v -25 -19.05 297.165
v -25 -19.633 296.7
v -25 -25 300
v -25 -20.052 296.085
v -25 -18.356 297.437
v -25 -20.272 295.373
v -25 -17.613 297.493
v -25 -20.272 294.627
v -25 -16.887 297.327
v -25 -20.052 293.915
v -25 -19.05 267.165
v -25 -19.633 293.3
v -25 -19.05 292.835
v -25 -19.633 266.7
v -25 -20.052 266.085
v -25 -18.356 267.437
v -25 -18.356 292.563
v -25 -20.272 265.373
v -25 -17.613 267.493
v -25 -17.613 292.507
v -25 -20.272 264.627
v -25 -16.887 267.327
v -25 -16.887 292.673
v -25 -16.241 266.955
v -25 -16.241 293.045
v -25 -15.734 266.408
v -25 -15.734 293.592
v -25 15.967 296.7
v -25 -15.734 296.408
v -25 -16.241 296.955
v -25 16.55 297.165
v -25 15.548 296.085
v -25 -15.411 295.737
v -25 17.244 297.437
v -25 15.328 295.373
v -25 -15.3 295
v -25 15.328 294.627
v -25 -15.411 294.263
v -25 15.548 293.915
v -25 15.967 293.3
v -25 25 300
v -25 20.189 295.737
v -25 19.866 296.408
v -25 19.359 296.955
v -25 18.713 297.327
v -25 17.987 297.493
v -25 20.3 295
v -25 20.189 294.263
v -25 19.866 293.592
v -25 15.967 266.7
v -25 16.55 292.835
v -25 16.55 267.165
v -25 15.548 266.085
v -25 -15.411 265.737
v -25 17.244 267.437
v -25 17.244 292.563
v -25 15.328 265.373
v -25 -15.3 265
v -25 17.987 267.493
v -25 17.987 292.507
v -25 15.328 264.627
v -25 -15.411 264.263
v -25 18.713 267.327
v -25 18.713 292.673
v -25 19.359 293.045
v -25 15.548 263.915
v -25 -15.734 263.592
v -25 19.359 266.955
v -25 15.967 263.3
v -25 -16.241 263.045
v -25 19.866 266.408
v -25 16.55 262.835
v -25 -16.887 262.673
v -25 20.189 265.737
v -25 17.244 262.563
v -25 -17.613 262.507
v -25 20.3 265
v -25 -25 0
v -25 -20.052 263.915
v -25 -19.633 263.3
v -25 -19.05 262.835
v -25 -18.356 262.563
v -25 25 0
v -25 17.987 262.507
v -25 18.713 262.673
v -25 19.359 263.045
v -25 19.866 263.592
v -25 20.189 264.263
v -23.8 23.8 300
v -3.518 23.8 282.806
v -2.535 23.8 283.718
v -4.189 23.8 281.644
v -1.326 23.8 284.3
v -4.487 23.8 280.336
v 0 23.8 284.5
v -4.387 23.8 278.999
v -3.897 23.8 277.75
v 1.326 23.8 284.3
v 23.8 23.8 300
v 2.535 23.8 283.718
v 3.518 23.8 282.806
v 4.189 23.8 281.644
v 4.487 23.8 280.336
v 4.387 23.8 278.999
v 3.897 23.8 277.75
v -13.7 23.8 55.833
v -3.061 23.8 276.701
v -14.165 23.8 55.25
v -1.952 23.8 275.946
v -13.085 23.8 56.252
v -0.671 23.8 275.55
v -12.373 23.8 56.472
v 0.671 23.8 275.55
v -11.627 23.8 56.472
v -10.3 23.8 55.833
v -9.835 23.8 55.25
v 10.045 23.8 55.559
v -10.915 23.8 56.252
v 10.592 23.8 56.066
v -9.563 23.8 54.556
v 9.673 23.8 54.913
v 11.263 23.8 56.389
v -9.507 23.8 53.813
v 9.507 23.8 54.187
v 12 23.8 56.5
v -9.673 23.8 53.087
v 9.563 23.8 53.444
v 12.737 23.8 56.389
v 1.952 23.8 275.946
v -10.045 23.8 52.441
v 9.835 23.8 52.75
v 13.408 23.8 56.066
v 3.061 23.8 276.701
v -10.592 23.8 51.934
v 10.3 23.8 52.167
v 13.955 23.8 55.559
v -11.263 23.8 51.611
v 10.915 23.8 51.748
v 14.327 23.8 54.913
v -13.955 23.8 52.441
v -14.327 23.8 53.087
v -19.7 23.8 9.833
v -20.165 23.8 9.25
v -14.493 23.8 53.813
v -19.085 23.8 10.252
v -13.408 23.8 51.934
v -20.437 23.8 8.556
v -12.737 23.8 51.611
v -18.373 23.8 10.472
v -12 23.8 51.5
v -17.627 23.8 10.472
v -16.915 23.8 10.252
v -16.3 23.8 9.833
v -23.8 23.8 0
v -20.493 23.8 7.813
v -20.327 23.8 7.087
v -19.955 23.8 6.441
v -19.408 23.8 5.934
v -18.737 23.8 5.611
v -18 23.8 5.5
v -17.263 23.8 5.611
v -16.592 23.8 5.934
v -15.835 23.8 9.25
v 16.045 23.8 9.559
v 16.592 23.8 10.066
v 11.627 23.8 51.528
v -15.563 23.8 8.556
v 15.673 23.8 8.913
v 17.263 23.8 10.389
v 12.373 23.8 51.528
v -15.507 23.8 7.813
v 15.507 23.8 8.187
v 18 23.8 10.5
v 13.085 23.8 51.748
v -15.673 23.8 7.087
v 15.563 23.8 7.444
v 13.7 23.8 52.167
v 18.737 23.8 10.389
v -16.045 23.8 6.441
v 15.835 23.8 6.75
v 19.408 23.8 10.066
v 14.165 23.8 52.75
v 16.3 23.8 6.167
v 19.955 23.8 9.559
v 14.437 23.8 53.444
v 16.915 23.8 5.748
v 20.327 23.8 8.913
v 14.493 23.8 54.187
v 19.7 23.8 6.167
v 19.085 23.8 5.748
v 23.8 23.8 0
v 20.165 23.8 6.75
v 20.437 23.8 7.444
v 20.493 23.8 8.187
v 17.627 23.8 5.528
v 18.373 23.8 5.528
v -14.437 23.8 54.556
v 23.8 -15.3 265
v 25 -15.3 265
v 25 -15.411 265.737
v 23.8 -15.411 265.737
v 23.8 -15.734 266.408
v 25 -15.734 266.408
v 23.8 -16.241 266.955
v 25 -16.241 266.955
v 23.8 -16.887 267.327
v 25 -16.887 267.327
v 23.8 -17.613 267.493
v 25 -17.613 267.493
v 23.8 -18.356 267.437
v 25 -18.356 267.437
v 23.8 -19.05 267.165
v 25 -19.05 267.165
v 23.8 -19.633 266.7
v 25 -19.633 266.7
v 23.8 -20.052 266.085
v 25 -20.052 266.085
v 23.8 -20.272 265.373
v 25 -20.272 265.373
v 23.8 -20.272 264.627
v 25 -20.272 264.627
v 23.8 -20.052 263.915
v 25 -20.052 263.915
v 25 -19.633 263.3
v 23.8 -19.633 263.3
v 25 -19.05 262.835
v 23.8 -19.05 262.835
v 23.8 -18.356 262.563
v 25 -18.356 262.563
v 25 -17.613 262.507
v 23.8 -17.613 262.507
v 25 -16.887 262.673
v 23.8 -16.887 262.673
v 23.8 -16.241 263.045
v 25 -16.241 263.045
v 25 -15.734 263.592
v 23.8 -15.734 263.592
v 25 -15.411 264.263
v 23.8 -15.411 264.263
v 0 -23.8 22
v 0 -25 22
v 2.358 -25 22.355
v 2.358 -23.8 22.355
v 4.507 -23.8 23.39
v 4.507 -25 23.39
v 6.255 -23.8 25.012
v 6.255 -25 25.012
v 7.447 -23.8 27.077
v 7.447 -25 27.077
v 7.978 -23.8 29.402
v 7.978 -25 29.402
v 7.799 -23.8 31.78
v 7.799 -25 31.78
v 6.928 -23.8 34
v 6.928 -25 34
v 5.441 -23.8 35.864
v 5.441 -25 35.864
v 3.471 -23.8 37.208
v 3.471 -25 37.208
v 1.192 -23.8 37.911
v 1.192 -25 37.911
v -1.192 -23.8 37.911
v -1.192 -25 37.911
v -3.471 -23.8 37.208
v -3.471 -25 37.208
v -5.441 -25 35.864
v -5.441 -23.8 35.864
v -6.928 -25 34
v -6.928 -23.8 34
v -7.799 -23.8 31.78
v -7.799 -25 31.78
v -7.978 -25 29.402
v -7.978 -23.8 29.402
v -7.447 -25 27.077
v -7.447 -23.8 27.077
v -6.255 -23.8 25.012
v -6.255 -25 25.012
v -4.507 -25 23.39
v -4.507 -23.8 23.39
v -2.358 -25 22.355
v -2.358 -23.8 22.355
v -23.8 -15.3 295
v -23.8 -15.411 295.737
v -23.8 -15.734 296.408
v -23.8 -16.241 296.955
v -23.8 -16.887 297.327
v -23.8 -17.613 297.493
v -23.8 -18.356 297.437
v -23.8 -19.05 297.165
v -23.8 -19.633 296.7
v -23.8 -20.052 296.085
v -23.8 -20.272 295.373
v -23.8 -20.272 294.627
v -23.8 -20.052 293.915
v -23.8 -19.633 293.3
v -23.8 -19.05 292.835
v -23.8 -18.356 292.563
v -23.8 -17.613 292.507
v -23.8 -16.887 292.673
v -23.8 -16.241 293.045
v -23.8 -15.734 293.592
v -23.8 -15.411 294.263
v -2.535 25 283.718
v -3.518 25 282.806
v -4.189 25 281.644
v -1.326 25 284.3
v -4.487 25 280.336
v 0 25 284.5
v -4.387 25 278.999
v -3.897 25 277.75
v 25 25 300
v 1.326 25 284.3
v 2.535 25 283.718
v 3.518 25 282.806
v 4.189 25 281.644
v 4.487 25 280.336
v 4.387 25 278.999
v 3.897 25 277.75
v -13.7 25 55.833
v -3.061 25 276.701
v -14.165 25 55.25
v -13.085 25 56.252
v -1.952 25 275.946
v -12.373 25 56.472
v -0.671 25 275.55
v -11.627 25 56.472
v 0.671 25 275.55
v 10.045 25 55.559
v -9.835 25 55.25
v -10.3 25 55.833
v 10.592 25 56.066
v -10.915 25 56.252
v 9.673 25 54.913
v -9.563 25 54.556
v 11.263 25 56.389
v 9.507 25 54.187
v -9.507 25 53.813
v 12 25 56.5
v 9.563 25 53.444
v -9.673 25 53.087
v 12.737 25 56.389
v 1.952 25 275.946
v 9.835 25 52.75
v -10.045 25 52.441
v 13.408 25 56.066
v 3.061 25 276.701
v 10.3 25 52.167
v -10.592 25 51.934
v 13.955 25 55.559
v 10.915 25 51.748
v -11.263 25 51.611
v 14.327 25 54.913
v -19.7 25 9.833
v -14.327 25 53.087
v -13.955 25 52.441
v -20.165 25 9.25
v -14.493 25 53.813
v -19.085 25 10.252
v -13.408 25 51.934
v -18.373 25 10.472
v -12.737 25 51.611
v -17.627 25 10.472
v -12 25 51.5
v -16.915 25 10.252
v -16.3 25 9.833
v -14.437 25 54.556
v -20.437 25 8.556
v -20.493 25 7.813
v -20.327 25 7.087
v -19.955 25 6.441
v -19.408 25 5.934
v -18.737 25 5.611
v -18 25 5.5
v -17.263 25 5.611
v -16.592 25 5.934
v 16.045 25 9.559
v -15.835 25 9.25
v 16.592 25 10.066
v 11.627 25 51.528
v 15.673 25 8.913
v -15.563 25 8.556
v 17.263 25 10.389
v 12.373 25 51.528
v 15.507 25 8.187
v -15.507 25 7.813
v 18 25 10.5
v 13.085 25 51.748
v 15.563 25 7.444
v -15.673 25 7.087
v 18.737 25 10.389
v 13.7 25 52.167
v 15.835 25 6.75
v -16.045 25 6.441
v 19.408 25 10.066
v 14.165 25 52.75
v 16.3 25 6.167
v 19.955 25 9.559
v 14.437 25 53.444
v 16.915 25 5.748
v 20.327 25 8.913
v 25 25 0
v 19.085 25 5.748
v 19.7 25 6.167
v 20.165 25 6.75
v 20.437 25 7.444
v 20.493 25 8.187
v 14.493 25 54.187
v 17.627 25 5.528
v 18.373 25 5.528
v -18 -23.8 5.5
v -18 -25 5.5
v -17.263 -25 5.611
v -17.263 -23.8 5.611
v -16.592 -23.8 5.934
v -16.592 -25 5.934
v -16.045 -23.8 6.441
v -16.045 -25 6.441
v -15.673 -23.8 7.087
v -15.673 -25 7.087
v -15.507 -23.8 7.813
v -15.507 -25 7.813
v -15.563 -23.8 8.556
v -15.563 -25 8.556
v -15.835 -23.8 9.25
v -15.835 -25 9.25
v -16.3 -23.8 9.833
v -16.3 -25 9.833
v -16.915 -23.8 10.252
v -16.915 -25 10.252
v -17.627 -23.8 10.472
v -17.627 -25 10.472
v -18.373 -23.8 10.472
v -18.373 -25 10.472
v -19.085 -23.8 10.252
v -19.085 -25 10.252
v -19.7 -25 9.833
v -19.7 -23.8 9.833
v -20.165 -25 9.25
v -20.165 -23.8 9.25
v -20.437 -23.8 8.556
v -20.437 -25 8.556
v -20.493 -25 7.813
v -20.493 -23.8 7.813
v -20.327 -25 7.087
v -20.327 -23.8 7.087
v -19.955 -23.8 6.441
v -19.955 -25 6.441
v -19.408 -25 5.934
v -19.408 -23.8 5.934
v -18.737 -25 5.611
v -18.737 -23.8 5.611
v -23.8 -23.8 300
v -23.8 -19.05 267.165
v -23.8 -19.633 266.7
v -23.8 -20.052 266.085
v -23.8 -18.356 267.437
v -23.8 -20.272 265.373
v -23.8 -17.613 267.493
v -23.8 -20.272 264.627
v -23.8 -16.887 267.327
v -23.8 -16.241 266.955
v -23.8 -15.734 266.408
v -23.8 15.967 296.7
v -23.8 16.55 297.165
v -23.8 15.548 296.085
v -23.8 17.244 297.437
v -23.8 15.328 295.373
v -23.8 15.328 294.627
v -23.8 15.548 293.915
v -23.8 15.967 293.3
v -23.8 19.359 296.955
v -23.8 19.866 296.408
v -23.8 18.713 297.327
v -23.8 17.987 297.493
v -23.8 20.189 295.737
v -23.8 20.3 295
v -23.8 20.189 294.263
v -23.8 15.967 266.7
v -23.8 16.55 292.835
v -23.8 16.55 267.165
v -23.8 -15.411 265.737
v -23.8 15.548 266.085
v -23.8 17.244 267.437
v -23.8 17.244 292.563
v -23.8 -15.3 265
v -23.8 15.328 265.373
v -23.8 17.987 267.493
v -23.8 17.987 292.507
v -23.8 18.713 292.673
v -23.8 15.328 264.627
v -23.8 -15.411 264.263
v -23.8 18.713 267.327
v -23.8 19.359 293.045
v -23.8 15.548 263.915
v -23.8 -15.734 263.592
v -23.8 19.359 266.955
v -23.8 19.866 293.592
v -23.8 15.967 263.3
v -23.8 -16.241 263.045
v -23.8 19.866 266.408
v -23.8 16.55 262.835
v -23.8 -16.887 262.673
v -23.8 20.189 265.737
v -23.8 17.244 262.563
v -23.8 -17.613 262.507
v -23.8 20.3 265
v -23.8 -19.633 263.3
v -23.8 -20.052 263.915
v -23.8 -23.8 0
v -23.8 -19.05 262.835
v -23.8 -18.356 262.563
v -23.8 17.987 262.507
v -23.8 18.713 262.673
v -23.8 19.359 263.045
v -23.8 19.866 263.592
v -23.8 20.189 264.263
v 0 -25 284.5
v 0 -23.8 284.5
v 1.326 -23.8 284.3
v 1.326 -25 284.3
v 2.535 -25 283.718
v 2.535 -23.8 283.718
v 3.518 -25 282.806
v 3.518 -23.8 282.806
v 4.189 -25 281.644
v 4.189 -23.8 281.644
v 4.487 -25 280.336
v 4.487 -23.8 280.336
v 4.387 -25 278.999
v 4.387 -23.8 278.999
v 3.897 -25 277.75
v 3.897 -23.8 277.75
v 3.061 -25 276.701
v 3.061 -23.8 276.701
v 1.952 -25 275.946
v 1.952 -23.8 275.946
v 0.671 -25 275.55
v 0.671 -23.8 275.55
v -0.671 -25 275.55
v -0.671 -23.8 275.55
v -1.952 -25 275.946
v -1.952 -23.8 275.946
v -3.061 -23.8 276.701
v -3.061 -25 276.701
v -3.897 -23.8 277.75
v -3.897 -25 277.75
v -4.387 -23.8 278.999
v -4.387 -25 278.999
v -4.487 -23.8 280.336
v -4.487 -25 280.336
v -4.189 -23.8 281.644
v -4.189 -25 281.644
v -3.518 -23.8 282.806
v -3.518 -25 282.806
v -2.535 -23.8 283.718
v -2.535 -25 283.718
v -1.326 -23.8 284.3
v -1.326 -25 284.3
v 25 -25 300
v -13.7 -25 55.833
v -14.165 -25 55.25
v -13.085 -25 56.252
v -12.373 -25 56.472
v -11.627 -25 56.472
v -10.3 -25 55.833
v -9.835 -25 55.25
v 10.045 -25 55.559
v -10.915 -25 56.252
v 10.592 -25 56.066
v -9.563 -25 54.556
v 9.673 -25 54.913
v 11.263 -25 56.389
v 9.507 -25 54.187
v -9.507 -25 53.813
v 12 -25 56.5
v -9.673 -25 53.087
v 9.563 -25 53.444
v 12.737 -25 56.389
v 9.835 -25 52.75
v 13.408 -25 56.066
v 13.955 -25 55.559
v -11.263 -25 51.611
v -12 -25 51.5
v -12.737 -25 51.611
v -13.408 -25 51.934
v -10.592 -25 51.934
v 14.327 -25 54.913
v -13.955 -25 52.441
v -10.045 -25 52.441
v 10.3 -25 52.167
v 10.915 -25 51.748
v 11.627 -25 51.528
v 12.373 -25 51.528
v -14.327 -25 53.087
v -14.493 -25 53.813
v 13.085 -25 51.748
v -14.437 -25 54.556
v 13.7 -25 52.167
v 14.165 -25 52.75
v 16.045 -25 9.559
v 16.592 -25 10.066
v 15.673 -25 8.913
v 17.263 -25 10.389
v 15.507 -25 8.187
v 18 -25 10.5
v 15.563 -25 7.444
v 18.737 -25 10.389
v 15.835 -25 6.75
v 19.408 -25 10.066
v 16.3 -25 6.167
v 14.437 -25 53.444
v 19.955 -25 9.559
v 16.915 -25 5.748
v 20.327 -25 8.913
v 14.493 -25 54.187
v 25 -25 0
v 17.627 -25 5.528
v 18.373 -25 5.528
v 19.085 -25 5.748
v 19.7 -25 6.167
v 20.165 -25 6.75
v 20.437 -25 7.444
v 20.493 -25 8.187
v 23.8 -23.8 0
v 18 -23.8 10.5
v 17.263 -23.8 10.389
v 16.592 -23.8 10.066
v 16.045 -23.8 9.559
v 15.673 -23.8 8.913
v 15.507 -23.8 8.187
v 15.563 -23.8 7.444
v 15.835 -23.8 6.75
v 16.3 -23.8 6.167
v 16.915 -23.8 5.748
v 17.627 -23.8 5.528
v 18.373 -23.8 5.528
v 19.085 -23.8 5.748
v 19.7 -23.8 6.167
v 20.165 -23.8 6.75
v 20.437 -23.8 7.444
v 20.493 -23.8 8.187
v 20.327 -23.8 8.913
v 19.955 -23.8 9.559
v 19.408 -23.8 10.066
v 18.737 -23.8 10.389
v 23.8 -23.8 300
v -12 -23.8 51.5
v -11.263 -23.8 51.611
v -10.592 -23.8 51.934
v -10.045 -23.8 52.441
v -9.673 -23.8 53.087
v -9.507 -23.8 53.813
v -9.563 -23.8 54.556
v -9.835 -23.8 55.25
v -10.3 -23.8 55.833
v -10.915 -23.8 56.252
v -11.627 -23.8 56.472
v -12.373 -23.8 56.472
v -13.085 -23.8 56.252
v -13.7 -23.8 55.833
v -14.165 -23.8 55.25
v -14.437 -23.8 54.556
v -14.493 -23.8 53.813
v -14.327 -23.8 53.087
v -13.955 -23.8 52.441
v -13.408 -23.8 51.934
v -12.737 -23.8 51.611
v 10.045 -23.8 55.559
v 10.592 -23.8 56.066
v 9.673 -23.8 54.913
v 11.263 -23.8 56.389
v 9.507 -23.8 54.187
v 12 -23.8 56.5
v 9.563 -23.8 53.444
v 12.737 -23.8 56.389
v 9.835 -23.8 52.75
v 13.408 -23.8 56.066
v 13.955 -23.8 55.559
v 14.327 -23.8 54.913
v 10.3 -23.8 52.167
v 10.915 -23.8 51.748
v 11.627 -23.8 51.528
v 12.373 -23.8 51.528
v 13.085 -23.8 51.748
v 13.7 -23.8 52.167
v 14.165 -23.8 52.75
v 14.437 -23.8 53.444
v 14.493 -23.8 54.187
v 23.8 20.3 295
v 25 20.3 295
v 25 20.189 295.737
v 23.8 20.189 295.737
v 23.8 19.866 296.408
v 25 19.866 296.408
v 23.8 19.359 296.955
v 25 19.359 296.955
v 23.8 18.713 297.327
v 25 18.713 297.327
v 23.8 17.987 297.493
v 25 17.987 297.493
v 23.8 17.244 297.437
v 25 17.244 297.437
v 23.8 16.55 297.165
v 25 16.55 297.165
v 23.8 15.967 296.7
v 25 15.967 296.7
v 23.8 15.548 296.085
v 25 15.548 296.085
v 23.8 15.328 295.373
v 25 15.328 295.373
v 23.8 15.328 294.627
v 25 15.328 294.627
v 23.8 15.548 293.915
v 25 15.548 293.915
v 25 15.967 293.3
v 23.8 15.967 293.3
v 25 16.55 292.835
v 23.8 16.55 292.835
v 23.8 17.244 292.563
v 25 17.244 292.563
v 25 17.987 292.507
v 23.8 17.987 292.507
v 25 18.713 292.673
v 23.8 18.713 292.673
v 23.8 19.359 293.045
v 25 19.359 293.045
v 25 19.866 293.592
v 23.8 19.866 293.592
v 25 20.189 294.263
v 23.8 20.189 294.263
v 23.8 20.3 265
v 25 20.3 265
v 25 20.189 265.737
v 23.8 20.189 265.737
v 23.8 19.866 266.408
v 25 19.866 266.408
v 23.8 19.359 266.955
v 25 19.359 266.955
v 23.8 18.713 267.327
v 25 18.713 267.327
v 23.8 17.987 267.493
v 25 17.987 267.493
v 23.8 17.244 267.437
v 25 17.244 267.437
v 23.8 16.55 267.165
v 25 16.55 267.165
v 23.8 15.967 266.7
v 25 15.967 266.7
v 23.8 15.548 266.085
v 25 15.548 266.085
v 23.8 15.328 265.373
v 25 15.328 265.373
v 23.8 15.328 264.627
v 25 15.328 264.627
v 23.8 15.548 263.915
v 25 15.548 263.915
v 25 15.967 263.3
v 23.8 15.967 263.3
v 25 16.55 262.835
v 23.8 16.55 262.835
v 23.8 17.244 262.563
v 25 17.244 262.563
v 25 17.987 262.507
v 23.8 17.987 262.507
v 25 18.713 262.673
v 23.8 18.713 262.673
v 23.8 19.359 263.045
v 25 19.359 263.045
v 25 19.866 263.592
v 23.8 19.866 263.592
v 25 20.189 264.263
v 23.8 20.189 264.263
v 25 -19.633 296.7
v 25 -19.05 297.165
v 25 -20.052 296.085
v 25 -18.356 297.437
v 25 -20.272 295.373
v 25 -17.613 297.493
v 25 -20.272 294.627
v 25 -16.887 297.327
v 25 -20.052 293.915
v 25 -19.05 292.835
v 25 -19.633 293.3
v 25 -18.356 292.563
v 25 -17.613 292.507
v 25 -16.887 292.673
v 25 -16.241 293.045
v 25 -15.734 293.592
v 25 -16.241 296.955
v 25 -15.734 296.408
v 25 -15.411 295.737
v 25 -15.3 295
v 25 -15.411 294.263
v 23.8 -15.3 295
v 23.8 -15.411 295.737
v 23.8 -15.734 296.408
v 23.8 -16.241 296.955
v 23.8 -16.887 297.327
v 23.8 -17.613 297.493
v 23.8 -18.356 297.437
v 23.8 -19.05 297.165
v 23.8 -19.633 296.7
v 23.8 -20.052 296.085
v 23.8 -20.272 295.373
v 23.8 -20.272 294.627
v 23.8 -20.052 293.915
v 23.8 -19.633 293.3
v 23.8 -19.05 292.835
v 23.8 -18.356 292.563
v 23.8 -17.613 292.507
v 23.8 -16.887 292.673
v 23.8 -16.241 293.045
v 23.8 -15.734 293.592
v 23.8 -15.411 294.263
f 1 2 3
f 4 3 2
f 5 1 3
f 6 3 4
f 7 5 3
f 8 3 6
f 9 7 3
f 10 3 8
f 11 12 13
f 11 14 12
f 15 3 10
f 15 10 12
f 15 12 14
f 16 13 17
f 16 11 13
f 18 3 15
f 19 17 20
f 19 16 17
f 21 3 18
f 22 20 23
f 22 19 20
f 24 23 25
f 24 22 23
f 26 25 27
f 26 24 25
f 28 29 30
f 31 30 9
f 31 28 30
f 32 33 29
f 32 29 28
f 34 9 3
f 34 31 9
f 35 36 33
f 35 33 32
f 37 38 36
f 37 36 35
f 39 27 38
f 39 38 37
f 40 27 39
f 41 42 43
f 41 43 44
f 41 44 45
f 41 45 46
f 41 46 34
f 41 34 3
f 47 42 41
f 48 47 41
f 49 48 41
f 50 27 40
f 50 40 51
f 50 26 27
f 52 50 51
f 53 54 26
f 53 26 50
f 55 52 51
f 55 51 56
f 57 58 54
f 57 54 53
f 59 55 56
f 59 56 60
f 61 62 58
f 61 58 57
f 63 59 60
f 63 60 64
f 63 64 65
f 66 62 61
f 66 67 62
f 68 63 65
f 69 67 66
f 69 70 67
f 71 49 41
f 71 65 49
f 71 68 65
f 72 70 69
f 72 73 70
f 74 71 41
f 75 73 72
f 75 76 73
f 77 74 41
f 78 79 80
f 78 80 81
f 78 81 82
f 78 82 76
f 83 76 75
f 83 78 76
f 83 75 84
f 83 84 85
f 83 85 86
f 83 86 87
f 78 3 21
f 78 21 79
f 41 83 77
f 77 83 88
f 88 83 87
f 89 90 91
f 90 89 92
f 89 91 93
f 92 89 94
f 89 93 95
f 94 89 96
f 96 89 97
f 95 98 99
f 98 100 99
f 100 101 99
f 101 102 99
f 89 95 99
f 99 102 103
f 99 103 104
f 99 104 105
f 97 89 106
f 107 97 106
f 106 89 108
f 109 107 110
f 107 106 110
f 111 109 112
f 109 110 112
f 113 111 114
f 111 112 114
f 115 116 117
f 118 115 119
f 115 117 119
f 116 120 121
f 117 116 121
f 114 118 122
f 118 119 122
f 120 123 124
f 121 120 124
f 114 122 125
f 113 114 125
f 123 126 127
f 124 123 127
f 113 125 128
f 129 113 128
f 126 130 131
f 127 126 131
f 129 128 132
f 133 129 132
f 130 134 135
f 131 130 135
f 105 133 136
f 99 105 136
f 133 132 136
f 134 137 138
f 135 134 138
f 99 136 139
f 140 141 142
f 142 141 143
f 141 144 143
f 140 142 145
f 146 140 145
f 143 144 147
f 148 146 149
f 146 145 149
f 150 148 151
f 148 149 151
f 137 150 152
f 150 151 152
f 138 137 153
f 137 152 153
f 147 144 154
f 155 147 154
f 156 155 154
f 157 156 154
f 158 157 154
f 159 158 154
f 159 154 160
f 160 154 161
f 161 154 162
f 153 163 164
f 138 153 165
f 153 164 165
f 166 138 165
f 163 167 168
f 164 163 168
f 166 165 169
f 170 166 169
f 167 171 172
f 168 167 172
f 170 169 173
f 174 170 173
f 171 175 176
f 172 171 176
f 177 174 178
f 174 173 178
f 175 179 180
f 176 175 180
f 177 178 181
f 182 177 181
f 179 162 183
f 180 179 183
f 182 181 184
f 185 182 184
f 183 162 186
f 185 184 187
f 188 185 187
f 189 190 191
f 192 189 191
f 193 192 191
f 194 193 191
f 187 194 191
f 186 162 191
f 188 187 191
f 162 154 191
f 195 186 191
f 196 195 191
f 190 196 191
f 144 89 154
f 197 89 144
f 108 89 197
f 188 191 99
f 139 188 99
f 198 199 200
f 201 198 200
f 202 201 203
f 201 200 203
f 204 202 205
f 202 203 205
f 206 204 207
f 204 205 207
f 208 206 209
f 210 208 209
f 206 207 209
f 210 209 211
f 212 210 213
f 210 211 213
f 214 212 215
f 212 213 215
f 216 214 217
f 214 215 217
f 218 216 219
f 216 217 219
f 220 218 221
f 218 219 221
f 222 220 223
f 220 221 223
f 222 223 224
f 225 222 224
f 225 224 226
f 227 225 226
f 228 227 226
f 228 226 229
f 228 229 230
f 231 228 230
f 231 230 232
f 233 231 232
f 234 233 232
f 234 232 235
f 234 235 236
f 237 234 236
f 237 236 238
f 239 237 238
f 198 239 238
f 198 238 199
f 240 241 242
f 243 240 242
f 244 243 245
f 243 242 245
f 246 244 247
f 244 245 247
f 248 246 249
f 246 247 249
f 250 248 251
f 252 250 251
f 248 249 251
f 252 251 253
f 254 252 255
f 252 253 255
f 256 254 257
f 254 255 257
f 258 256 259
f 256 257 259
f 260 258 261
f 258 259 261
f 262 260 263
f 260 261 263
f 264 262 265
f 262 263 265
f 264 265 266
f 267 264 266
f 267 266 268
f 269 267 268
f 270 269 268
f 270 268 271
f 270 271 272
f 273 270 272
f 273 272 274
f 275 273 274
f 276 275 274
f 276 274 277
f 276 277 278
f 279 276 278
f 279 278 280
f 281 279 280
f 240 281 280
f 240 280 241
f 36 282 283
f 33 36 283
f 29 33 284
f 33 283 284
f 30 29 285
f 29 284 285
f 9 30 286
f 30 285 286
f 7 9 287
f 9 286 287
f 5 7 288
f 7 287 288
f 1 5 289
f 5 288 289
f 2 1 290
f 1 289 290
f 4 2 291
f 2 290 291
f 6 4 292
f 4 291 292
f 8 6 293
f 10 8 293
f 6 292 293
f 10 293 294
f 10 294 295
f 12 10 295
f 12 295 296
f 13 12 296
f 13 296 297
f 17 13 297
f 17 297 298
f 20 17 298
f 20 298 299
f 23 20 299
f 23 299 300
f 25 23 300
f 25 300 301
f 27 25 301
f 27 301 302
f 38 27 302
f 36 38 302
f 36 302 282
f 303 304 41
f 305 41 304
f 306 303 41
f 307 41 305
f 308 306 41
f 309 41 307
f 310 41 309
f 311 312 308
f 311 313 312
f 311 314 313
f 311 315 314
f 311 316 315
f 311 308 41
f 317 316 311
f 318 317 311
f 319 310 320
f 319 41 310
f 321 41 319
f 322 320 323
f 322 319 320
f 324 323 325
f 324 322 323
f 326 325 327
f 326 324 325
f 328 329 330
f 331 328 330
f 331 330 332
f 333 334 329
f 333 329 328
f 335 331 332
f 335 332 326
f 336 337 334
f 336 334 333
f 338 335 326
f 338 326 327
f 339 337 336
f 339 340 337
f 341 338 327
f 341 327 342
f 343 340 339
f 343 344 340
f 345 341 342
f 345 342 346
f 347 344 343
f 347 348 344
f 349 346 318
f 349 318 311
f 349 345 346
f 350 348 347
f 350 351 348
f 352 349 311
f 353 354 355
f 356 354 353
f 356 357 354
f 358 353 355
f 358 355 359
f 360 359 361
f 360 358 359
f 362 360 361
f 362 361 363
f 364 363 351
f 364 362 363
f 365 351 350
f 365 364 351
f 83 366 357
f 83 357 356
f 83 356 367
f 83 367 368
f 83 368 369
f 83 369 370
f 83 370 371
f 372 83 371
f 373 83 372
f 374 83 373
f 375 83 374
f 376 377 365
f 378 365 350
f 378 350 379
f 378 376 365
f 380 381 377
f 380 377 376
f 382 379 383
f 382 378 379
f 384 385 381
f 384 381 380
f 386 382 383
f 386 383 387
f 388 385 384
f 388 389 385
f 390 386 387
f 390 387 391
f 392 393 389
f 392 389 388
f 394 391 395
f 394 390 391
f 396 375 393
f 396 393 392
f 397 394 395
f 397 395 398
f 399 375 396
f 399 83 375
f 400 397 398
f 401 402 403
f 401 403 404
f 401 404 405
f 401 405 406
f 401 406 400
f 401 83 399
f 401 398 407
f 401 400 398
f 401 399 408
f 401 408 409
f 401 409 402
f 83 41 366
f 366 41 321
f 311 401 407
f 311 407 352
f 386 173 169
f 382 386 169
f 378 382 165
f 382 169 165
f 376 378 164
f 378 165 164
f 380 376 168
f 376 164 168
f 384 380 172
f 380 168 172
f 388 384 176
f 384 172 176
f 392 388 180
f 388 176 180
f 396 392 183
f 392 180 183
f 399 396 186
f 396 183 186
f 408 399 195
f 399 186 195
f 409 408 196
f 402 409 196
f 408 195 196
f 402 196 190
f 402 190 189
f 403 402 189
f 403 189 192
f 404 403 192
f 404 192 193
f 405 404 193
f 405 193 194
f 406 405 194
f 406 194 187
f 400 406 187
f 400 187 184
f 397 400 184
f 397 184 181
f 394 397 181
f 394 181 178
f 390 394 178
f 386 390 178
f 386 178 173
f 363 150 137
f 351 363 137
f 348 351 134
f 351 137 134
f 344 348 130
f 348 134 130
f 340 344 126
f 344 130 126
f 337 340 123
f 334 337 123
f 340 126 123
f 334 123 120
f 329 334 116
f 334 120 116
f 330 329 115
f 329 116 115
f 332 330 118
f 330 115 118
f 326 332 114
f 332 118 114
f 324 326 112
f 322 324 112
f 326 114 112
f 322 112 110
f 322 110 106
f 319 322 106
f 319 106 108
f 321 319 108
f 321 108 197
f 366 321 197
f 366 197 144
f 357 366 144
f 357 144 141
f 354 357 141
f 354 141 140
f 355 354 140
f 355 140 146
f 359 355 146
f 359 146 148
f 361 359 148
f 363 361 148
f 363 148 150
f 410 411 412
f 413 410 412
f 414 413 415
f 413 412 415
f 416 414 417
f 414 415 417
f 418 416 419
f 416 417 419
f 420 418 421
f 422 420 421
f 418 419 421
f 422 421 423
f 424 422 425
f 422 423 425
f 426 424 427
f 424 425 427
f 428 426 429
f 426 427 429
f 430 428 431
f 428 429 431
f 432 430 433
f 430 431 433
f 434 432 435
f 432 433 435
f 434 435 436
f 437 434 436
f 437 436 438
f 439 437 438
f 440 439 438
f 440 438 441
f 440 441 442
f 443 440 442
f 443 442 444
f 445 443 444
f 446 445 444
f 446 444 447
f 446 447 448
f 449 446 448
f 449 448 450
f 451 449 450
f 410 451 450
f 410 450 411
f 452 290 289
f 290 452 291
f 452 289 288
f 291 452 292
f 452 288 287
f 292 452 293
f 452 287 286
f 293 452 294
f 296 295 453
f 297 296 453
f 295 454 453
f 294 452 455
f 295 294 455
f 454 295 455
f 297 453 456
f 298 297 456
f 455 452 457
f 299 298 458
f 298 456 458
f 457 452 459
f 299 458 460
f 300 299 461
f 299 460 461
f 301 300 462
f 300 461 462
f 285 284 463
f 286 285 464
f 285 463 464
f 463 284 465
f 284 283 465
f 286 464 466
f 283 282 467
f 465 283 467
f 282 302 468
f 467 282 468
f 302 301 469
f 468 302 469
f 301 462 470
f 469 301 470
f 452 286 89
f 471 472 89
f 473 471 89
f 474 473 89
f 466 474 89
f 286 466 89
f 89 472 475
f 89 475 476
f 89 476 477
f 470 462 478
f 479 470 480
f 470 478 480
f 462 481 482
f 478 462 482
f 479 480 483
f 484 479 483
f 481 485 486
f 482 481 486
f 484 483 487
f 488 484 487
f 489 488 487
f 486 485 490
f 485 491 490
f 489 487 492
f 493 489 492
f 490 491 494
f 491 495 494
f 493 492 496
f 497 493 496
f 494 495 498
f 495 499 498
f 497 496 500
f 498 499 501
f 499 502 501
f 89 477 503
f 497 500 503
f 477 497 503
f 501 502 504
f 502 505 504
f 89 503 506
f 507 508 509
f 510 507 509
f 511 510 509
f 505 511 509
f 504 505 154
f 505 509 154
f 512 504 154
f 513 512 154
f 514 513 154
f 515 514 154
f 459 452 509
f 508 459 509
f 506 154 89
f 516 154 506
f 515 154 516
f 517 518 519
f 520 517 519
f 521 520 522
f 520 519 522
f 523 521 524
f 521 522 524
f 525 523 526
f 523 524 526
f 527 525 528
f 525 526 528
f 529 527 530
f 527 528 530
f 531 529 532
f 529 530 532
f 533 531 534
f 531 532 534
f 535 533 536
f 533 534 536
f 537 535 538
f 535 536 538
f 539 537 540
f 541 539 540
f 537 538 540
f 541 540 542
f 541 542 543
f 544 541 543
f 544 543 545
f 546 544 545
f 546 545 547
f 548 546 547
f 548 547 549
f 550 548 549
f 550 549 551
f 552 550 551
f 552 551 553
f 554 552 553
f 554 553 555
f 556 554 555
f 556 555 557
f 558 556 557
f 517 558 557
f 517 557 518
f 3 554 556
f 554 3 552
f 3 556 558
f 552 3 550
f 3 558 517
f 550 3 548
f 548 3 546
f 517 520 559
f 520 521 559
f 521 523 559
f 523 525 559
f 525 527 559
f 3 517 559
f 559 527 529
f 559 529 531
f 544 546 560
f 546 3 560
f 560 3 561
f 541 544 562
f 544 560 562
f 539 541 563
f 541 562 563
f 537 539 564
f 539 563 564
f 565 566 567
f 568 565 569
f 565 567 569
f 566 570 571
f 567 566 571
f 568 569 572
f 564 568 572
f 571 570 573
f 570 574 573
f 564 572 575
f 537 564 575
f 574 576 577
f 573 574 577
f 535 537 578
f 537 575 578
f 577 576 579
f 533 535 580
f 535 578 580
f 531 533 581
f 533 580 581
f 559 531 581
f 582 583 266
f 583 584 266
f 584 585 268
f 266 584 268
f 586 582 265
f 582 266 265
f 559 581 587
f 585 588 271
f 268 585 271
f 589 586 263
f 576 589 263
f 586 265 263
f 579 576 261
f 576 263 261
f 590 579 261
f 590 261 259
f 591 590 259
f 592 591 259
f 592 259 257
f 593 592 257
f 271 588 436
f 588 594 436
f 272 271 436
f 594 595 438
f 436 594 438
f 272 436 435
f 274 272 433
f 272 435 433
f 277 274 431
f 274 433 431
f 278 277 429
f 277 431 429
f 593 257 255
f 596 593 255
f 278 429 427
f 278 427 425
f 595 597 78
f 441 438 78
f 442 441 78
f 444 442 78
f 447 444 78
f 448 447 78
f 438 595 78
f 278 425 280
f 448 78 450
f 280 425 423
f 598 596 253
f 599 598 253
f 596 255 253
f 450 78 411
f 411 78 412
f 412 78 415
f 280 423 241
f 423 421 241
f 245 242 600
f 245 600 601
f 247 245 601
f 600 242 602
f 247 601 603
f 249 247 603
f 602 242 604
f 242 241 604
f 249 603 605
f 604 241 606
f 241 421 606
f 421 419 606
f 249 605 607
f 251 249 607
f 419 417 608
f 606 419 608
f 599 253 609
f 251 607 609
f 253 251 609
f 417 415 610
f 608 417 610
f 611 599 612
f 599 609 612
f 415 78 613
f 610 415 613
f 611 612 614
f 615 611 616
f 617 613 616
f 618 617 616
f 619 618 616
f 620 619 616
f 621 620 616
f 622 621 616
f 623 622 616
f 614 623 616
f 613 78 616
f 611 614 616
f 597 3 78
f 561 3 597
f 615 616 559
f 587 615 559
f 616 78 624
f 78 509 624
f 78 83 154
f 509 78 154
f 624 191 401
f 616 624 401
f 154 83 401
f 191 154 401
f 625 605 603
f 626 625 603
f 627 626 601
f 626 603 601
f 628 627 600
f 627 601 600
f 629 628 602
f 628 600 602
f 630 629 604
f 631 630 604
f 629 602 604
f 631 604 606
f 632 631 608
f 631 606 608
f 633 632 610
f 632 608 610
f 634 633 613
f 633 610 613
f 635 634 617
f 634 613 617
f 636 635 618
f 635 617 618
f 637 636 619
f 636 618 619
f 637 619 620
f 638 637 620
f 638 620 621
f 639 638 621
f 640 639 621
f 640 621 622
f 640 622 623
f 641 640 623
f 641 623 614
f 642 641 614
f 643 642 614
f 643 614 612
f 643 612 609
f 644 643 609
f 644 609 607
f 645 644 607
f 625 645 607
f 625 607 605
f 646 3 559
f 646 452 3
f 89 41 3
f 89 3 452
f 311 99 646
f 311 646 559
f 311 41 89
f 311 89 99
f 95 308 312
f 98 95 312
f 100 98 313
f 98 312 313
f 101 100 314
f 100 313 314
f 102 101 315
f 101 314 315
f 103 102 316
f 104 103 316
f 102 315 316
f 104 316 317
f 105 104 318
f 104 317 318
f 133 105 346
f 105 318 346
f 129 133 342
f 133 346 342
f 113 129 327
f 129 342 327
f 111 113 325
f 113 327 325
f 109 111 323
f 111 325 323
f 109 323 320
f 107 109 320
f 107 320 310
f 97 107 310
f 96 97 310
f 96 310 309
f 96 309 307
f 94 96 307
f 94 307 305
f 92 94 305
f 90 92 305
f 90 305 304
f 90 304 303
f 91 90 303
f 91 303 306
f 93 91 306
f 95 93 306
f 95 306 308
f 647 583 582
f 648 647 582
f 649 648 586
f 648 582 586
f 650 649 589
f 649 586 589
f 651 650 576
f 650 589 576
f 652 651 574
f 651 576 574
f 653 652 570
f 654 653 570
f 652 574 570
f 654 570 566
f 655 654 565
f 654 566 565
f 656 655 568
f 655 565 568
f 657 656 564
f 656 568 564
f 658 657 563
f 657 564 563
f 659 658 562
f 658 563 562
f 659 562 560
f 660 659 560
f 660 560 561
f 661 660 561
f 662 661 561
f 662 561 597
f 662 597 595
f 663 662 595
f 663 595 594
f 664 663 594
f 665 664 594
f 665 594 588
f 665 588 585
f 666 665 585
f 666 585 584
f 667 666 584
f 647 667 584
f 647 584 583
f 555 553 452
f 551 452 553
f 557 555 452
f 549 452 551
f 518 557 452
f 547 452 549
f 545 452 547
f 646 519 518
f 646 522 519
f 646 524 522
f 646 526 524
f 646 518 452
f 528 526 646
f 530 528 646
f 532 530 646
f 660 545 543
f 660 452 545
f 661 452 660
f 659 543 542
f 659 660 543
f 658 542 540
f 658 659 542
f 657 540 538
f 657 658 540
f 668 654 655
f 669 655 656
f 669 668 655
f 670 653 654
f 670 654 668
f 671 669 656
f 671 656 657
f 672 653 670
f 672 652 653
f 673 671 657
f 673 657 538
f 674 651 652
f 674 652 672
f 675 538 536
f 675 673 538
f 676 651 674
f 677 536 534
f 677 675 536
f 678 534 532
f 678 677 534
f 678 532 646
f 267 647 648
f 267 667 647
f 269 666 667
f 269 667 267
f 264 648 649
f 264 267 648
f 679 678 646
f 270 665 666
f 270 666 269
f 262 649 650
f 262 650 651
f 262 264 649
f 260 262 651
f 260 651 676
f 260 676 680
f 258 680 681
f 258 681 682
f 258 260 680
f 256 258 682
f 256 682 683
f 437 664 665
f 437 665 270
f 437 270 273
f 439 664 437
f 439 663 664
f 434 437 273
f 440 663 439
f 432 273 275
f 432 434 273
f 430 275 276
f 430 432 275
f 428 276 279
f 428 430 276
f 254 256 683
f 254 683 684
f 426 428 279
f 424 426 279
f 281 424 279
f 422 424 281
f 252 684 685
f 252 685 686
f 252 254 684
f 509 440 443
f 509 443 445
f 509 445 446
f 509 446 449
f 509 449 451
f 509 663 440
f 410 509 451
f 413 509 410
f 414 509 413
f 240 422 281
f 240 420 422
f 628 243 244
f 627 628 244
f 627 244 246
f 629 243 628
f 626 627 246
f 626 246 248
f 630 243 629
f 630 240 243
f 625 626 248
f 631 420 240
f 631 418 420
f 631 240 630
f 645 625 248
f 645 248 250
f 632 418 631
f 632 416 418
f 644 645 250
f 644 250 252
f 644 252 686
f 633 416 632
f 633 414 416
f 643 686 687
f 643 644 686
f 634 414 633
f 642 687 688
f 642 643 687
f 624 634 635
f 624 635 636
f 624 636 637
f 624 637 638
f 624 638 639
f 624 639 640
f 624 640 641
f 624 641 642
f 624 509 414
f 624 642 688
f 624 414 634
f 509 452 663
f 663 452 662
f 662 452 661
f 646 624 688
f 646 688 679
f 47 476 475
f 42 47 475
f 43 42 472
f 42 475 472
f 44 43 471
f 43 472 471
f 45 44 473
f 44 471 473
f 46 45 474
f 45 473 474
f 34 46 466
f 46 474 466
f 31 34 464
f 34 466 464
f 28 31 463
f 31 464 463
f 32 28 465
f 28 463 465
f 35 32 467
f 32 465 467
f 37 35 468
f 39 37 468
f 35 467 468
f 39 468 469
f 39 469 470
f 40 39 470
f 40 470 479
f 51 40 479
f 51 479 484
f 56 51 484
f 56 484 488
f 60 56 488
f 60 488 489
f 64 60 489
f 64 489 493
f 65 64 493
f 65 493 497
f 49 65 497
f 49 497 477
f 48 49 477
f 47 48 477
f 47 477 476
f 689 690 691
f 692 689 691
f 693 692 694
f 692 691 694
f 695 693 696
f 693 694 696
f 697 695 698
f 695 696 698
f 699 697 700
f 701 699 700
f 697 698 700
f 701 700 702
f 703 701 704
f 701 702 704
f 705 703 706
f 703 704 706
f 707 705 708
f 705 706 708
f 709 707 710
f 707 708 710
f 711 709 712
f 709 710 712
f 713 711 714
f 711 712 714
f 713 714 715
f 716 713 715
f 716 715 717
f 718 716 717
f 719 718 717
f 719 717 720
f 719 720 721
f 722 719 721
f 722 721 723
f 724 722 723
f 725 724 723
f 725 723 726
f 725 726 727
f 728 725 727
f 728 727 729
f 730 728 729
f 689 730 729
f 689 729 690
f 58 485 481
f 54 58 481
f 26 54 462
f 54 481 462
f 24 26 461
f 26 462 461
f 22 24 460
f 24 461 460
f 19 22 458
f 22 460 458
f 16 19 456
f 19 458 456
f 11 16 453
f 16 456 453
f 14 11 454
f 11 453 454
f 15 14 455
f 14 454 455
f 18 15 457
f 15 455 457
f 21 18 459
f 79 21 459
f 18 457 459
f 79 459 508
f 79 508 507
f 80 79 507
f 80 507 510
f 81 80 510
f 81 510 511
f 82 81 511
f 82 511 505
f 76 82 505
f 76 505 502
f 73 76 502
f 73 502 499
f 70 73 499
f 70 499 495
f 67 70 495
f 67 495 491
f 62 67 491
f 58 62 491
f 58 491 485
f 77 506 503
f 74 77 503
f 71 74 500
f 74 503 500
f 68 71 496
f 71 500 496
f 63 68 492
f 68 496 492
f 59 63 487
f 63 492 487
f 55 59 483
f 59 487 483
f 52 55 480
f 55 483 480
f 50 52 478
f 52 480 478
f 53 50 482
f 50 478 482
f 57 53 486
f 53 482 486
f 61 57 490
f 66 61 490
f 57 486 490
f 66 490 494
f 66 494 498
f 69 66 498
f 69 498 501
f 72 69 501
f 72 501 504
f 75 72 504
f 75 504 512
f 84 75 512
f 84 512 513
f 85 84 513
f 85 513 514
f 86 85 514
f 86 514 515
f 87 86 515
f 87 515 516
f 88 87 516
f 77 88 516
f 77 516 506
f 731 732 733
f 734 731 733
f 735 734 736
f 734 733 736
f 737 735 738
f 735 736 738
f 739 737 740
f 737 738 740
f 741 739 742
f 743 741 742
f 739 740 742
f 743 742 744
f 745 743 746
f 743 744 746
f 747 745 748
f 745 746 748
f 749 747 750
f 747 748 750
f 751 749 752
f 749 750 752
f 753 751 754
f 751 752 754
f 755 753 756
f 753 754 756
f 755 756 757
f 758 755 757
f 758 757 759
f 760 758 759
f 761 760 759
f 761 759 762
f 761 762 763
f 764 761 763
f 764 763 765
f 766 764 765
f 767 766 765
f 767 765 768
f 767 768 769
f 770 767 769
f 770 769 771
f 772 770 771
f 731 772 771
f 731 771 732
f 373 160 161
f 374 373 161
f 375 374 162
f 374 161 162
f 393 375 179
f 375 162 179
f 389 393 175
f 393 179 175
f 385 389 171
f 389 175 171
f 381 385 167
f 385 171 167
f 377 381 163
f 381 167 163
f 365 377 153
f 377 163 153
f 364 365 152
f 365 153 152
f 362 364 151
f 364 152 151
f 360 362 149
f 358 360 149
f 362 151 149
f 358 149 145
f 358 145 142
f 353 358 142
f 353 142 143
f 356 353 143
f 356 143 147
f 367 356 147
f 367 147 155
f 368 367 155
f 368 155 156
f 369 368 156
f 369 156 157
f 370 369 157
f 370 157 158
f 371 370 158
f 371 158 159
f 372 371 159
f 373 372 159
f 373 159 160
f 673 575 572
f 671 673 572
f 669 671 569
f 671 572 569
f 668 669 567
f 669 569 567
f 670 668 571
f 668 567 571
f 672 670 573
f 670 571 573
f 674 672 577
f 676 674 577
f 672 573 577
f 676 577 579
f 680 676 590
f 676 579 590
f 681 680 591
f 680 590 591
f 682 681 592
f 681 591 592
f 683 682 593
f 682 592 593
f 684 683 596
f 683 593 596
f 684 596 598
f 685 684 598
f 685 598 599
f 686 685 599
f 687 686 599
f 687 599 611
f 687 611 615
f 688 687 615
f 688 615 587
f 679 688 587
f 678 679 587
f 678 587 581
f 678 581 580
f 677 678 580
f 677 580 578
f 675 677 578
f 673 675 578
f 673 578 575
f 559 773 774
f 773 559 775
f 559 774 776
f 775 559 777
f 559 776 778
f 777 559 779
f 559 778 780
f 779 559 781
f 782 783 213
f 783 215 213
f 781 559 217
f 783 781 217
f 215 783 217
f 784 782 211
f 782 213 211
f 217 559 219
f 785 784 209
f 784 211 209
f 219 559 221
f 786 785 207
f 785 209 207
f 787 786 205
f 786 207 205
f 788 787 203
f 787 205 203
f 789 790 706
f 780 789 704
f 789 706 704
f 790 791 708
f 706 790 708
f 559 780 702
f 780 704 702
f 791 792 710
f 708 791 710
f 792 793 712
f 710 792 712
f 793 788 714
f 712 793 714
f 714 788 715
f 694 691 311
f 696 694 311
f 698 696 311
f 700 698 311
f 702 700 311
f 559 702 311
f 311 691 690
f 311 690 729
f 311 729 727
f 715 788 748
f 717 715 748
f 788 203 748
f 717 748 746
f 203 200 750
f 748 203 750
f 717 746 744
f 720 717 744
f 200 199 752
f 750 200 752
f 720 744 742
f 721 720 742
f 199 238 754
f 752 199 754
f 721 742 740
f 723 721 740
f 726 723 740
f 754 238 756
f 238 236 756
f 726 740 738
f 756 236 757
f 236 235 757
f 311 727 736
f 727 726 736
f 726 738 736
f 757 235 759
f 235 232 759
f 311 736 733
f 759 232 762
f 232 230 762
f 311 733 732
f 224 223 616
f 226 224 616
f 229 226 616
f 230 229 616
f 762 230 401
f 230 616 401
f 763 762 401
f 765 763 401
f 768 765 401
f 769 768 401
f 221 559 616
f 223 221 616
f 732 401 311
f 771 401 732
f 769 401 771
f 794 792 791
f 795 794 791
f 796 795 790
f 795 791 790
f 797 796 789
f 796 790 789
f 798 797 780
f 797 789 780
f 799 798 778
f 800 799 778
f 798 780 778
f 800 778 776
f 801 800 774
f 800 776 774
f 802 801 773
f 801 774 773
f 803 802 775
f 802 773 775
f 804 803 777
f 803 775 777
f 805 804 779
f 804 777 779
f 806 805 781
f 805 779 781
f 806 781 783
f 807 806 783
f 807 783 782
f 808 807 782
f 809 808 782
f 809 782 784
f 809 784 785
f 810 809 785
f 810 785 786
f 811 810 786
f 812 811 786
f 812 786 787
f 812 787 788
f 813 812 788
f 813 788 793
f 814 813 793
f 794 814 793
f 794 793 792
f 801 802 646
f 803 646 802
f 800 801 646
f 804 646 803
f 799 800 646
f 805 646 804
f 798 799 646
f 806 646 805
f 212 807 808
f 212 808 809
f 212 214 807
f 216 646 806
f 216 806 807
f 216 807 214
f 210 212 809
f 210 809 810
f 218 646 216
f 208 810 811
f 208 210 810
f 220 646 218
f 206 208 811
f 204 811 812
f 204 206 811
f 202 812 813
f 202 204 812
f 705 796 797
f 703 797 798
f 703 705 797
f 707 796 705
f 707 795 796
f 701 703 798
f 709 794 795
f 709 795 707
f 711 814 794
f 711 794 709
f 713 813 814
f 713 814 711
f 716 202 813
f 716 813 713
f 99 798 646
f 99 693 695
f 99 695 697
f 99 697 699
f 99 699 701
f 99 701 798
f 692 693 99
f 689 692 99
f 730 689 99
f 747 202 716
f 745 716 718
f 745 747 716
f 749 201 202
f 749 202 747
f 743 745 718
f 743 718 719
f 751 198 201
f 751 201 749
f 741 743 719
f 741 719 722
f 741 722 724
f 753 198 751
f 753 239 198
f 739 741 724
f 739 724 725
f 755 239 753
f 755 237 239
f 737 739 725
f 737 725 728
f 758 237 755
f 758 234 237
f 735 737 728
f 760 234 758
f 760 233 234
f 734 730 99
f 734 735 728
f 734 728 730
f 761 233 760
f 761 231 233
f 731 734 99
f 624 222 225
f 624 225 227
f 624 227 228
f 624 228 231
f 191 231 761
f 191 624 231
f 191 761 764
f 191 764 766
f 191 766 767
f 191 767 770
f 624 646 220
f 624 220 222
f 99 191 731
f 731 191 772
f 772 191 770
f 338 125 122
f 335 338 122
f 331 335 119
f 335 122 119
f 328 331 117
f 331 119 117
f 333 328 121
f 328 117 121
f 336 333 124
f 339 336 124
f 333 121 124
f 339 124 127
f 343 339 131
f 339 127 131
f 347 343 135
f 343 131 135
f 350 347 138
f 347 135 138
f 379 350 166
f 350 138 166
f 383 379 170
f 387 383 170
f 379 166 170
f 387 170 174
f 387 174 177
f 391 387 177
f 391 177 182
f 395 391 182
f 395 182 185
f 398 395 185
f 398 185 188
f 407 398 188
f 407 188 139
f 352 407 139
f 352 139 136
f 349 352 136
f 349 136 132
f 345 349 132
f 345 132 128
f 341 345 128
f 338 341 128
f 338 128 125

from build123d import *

# Parameters (mm, degrees)
CROQUIS1_W              = 50
CROQUIS1_H              = 50
CROQUIS1_W_2            = 47.6
CROQUIS1_H_2            = 47.6
SALIENTE_EXTRUIR1_DEPTH = 300
CROQUIS2_R              = 2.5
CORTAR_EXTRUIR1_DEPTH   = 306.163890393
CROQUIS3_R              = 4.5
CORTAR_EXTRUIR2_DEPTH   = 306.163890393
CROQUIS4_R              = 8
CORTAR_EXTRUIR3_DEPTH   = 2
CROQUIS5_R              = 2.5
CORTAR_EXTRUIR4_DEPTH   = 306.163890393


with BuildPart() as part:
    # Croquis1 → Saliente-Extruir1 (new body)
    with BuildSketch(Plane.XY):
        Rectangle(CROQUIS1_W, CROQUIS1_H)
        Rectangle(CROQUIS1_W_2, CROQUIS1_H_2, mode=Mode.SUBTRACT)
    extrude(amount=SALIENTE_EXTRUIR1_DEPTH)

    # Croquis2 → Cortar-Extruir1 (cut, through all)
    with BuildSketch(Plane(origin=(25, 0, 0), x_dir=(0, 0, -1), z_dir=(1, 0, 0))):
        with Locations(Location((-295, 17.8, 0), (0, 0, 90))):
            Circle(CROQUIS2_R)
        with Locations(Location((-265, 17.8, 0), (0, 0, 90))):
            Circle(CROQUIS2_R)
        with Locations(Location((-265, -17.8, 0), (0, 0, 90))):
            Circle(CROQUIS2_R)
        with Locations(Location((-295, -17.8, 0), (0, 0, 90))):
            Circle(CROQUIS2_R)
    extrude(amount=-CORTAR_EXTRUIR1_DEPTH, mode=Mode.SUBTRACT)

    # Croquis3 → Cortar-Extruir2 (cut, through all)
    with BuildSketch(Plane(origin=(0, 25, 0), x_dir=(1, 0, 0), z_dir=(0, 1, 0))):
        with Locations(Location((0, -280, 0), (0, 0, 270))):
            Circle(CROQUIS3_R)
    extrude(amount=-CORTAR_EXTRUIR2_DEPTH, mode=Mode.SUBTRACT)

    # Croquis4 → Cortar-Extruir3 (cut)
    with BuildSketch(Plane.XZ.offset(25)):
        with Locations(Location((0, 30, 0), (0, 0, 270))):
            Circle(CROQUIS4_R)
    extrude(amount=-CORTAR_EXTRUIR3_DEPTH, mode=Mode.SUBTRACT)

    # Croquis5 → Cortar-Extruir4 (cut, through all)
    with BuildSketch(Plane.XZ.offset(25)):
        with Locations(Location((-18, 8, 0), (0, 0, 270))):
            Circle(CROQUIS5_R)
        with Locations(Location((-12, 54, 0), (0, 0, 270))):
            Circle(CROQUIS5_R)
        with Locations(Location((18, 8, 0), (0, 0, 90))):
            Circle(CROQUIS5_R)
        with Locations(Location((12, 54, 0), (0, 0, 90))):
            Circle(CROQUIS5_R)
    extrude(amount=-CORTAR_EXTRUIR4_DEPTH, mode=Mode.SUBTRACT)


solid = part.part
